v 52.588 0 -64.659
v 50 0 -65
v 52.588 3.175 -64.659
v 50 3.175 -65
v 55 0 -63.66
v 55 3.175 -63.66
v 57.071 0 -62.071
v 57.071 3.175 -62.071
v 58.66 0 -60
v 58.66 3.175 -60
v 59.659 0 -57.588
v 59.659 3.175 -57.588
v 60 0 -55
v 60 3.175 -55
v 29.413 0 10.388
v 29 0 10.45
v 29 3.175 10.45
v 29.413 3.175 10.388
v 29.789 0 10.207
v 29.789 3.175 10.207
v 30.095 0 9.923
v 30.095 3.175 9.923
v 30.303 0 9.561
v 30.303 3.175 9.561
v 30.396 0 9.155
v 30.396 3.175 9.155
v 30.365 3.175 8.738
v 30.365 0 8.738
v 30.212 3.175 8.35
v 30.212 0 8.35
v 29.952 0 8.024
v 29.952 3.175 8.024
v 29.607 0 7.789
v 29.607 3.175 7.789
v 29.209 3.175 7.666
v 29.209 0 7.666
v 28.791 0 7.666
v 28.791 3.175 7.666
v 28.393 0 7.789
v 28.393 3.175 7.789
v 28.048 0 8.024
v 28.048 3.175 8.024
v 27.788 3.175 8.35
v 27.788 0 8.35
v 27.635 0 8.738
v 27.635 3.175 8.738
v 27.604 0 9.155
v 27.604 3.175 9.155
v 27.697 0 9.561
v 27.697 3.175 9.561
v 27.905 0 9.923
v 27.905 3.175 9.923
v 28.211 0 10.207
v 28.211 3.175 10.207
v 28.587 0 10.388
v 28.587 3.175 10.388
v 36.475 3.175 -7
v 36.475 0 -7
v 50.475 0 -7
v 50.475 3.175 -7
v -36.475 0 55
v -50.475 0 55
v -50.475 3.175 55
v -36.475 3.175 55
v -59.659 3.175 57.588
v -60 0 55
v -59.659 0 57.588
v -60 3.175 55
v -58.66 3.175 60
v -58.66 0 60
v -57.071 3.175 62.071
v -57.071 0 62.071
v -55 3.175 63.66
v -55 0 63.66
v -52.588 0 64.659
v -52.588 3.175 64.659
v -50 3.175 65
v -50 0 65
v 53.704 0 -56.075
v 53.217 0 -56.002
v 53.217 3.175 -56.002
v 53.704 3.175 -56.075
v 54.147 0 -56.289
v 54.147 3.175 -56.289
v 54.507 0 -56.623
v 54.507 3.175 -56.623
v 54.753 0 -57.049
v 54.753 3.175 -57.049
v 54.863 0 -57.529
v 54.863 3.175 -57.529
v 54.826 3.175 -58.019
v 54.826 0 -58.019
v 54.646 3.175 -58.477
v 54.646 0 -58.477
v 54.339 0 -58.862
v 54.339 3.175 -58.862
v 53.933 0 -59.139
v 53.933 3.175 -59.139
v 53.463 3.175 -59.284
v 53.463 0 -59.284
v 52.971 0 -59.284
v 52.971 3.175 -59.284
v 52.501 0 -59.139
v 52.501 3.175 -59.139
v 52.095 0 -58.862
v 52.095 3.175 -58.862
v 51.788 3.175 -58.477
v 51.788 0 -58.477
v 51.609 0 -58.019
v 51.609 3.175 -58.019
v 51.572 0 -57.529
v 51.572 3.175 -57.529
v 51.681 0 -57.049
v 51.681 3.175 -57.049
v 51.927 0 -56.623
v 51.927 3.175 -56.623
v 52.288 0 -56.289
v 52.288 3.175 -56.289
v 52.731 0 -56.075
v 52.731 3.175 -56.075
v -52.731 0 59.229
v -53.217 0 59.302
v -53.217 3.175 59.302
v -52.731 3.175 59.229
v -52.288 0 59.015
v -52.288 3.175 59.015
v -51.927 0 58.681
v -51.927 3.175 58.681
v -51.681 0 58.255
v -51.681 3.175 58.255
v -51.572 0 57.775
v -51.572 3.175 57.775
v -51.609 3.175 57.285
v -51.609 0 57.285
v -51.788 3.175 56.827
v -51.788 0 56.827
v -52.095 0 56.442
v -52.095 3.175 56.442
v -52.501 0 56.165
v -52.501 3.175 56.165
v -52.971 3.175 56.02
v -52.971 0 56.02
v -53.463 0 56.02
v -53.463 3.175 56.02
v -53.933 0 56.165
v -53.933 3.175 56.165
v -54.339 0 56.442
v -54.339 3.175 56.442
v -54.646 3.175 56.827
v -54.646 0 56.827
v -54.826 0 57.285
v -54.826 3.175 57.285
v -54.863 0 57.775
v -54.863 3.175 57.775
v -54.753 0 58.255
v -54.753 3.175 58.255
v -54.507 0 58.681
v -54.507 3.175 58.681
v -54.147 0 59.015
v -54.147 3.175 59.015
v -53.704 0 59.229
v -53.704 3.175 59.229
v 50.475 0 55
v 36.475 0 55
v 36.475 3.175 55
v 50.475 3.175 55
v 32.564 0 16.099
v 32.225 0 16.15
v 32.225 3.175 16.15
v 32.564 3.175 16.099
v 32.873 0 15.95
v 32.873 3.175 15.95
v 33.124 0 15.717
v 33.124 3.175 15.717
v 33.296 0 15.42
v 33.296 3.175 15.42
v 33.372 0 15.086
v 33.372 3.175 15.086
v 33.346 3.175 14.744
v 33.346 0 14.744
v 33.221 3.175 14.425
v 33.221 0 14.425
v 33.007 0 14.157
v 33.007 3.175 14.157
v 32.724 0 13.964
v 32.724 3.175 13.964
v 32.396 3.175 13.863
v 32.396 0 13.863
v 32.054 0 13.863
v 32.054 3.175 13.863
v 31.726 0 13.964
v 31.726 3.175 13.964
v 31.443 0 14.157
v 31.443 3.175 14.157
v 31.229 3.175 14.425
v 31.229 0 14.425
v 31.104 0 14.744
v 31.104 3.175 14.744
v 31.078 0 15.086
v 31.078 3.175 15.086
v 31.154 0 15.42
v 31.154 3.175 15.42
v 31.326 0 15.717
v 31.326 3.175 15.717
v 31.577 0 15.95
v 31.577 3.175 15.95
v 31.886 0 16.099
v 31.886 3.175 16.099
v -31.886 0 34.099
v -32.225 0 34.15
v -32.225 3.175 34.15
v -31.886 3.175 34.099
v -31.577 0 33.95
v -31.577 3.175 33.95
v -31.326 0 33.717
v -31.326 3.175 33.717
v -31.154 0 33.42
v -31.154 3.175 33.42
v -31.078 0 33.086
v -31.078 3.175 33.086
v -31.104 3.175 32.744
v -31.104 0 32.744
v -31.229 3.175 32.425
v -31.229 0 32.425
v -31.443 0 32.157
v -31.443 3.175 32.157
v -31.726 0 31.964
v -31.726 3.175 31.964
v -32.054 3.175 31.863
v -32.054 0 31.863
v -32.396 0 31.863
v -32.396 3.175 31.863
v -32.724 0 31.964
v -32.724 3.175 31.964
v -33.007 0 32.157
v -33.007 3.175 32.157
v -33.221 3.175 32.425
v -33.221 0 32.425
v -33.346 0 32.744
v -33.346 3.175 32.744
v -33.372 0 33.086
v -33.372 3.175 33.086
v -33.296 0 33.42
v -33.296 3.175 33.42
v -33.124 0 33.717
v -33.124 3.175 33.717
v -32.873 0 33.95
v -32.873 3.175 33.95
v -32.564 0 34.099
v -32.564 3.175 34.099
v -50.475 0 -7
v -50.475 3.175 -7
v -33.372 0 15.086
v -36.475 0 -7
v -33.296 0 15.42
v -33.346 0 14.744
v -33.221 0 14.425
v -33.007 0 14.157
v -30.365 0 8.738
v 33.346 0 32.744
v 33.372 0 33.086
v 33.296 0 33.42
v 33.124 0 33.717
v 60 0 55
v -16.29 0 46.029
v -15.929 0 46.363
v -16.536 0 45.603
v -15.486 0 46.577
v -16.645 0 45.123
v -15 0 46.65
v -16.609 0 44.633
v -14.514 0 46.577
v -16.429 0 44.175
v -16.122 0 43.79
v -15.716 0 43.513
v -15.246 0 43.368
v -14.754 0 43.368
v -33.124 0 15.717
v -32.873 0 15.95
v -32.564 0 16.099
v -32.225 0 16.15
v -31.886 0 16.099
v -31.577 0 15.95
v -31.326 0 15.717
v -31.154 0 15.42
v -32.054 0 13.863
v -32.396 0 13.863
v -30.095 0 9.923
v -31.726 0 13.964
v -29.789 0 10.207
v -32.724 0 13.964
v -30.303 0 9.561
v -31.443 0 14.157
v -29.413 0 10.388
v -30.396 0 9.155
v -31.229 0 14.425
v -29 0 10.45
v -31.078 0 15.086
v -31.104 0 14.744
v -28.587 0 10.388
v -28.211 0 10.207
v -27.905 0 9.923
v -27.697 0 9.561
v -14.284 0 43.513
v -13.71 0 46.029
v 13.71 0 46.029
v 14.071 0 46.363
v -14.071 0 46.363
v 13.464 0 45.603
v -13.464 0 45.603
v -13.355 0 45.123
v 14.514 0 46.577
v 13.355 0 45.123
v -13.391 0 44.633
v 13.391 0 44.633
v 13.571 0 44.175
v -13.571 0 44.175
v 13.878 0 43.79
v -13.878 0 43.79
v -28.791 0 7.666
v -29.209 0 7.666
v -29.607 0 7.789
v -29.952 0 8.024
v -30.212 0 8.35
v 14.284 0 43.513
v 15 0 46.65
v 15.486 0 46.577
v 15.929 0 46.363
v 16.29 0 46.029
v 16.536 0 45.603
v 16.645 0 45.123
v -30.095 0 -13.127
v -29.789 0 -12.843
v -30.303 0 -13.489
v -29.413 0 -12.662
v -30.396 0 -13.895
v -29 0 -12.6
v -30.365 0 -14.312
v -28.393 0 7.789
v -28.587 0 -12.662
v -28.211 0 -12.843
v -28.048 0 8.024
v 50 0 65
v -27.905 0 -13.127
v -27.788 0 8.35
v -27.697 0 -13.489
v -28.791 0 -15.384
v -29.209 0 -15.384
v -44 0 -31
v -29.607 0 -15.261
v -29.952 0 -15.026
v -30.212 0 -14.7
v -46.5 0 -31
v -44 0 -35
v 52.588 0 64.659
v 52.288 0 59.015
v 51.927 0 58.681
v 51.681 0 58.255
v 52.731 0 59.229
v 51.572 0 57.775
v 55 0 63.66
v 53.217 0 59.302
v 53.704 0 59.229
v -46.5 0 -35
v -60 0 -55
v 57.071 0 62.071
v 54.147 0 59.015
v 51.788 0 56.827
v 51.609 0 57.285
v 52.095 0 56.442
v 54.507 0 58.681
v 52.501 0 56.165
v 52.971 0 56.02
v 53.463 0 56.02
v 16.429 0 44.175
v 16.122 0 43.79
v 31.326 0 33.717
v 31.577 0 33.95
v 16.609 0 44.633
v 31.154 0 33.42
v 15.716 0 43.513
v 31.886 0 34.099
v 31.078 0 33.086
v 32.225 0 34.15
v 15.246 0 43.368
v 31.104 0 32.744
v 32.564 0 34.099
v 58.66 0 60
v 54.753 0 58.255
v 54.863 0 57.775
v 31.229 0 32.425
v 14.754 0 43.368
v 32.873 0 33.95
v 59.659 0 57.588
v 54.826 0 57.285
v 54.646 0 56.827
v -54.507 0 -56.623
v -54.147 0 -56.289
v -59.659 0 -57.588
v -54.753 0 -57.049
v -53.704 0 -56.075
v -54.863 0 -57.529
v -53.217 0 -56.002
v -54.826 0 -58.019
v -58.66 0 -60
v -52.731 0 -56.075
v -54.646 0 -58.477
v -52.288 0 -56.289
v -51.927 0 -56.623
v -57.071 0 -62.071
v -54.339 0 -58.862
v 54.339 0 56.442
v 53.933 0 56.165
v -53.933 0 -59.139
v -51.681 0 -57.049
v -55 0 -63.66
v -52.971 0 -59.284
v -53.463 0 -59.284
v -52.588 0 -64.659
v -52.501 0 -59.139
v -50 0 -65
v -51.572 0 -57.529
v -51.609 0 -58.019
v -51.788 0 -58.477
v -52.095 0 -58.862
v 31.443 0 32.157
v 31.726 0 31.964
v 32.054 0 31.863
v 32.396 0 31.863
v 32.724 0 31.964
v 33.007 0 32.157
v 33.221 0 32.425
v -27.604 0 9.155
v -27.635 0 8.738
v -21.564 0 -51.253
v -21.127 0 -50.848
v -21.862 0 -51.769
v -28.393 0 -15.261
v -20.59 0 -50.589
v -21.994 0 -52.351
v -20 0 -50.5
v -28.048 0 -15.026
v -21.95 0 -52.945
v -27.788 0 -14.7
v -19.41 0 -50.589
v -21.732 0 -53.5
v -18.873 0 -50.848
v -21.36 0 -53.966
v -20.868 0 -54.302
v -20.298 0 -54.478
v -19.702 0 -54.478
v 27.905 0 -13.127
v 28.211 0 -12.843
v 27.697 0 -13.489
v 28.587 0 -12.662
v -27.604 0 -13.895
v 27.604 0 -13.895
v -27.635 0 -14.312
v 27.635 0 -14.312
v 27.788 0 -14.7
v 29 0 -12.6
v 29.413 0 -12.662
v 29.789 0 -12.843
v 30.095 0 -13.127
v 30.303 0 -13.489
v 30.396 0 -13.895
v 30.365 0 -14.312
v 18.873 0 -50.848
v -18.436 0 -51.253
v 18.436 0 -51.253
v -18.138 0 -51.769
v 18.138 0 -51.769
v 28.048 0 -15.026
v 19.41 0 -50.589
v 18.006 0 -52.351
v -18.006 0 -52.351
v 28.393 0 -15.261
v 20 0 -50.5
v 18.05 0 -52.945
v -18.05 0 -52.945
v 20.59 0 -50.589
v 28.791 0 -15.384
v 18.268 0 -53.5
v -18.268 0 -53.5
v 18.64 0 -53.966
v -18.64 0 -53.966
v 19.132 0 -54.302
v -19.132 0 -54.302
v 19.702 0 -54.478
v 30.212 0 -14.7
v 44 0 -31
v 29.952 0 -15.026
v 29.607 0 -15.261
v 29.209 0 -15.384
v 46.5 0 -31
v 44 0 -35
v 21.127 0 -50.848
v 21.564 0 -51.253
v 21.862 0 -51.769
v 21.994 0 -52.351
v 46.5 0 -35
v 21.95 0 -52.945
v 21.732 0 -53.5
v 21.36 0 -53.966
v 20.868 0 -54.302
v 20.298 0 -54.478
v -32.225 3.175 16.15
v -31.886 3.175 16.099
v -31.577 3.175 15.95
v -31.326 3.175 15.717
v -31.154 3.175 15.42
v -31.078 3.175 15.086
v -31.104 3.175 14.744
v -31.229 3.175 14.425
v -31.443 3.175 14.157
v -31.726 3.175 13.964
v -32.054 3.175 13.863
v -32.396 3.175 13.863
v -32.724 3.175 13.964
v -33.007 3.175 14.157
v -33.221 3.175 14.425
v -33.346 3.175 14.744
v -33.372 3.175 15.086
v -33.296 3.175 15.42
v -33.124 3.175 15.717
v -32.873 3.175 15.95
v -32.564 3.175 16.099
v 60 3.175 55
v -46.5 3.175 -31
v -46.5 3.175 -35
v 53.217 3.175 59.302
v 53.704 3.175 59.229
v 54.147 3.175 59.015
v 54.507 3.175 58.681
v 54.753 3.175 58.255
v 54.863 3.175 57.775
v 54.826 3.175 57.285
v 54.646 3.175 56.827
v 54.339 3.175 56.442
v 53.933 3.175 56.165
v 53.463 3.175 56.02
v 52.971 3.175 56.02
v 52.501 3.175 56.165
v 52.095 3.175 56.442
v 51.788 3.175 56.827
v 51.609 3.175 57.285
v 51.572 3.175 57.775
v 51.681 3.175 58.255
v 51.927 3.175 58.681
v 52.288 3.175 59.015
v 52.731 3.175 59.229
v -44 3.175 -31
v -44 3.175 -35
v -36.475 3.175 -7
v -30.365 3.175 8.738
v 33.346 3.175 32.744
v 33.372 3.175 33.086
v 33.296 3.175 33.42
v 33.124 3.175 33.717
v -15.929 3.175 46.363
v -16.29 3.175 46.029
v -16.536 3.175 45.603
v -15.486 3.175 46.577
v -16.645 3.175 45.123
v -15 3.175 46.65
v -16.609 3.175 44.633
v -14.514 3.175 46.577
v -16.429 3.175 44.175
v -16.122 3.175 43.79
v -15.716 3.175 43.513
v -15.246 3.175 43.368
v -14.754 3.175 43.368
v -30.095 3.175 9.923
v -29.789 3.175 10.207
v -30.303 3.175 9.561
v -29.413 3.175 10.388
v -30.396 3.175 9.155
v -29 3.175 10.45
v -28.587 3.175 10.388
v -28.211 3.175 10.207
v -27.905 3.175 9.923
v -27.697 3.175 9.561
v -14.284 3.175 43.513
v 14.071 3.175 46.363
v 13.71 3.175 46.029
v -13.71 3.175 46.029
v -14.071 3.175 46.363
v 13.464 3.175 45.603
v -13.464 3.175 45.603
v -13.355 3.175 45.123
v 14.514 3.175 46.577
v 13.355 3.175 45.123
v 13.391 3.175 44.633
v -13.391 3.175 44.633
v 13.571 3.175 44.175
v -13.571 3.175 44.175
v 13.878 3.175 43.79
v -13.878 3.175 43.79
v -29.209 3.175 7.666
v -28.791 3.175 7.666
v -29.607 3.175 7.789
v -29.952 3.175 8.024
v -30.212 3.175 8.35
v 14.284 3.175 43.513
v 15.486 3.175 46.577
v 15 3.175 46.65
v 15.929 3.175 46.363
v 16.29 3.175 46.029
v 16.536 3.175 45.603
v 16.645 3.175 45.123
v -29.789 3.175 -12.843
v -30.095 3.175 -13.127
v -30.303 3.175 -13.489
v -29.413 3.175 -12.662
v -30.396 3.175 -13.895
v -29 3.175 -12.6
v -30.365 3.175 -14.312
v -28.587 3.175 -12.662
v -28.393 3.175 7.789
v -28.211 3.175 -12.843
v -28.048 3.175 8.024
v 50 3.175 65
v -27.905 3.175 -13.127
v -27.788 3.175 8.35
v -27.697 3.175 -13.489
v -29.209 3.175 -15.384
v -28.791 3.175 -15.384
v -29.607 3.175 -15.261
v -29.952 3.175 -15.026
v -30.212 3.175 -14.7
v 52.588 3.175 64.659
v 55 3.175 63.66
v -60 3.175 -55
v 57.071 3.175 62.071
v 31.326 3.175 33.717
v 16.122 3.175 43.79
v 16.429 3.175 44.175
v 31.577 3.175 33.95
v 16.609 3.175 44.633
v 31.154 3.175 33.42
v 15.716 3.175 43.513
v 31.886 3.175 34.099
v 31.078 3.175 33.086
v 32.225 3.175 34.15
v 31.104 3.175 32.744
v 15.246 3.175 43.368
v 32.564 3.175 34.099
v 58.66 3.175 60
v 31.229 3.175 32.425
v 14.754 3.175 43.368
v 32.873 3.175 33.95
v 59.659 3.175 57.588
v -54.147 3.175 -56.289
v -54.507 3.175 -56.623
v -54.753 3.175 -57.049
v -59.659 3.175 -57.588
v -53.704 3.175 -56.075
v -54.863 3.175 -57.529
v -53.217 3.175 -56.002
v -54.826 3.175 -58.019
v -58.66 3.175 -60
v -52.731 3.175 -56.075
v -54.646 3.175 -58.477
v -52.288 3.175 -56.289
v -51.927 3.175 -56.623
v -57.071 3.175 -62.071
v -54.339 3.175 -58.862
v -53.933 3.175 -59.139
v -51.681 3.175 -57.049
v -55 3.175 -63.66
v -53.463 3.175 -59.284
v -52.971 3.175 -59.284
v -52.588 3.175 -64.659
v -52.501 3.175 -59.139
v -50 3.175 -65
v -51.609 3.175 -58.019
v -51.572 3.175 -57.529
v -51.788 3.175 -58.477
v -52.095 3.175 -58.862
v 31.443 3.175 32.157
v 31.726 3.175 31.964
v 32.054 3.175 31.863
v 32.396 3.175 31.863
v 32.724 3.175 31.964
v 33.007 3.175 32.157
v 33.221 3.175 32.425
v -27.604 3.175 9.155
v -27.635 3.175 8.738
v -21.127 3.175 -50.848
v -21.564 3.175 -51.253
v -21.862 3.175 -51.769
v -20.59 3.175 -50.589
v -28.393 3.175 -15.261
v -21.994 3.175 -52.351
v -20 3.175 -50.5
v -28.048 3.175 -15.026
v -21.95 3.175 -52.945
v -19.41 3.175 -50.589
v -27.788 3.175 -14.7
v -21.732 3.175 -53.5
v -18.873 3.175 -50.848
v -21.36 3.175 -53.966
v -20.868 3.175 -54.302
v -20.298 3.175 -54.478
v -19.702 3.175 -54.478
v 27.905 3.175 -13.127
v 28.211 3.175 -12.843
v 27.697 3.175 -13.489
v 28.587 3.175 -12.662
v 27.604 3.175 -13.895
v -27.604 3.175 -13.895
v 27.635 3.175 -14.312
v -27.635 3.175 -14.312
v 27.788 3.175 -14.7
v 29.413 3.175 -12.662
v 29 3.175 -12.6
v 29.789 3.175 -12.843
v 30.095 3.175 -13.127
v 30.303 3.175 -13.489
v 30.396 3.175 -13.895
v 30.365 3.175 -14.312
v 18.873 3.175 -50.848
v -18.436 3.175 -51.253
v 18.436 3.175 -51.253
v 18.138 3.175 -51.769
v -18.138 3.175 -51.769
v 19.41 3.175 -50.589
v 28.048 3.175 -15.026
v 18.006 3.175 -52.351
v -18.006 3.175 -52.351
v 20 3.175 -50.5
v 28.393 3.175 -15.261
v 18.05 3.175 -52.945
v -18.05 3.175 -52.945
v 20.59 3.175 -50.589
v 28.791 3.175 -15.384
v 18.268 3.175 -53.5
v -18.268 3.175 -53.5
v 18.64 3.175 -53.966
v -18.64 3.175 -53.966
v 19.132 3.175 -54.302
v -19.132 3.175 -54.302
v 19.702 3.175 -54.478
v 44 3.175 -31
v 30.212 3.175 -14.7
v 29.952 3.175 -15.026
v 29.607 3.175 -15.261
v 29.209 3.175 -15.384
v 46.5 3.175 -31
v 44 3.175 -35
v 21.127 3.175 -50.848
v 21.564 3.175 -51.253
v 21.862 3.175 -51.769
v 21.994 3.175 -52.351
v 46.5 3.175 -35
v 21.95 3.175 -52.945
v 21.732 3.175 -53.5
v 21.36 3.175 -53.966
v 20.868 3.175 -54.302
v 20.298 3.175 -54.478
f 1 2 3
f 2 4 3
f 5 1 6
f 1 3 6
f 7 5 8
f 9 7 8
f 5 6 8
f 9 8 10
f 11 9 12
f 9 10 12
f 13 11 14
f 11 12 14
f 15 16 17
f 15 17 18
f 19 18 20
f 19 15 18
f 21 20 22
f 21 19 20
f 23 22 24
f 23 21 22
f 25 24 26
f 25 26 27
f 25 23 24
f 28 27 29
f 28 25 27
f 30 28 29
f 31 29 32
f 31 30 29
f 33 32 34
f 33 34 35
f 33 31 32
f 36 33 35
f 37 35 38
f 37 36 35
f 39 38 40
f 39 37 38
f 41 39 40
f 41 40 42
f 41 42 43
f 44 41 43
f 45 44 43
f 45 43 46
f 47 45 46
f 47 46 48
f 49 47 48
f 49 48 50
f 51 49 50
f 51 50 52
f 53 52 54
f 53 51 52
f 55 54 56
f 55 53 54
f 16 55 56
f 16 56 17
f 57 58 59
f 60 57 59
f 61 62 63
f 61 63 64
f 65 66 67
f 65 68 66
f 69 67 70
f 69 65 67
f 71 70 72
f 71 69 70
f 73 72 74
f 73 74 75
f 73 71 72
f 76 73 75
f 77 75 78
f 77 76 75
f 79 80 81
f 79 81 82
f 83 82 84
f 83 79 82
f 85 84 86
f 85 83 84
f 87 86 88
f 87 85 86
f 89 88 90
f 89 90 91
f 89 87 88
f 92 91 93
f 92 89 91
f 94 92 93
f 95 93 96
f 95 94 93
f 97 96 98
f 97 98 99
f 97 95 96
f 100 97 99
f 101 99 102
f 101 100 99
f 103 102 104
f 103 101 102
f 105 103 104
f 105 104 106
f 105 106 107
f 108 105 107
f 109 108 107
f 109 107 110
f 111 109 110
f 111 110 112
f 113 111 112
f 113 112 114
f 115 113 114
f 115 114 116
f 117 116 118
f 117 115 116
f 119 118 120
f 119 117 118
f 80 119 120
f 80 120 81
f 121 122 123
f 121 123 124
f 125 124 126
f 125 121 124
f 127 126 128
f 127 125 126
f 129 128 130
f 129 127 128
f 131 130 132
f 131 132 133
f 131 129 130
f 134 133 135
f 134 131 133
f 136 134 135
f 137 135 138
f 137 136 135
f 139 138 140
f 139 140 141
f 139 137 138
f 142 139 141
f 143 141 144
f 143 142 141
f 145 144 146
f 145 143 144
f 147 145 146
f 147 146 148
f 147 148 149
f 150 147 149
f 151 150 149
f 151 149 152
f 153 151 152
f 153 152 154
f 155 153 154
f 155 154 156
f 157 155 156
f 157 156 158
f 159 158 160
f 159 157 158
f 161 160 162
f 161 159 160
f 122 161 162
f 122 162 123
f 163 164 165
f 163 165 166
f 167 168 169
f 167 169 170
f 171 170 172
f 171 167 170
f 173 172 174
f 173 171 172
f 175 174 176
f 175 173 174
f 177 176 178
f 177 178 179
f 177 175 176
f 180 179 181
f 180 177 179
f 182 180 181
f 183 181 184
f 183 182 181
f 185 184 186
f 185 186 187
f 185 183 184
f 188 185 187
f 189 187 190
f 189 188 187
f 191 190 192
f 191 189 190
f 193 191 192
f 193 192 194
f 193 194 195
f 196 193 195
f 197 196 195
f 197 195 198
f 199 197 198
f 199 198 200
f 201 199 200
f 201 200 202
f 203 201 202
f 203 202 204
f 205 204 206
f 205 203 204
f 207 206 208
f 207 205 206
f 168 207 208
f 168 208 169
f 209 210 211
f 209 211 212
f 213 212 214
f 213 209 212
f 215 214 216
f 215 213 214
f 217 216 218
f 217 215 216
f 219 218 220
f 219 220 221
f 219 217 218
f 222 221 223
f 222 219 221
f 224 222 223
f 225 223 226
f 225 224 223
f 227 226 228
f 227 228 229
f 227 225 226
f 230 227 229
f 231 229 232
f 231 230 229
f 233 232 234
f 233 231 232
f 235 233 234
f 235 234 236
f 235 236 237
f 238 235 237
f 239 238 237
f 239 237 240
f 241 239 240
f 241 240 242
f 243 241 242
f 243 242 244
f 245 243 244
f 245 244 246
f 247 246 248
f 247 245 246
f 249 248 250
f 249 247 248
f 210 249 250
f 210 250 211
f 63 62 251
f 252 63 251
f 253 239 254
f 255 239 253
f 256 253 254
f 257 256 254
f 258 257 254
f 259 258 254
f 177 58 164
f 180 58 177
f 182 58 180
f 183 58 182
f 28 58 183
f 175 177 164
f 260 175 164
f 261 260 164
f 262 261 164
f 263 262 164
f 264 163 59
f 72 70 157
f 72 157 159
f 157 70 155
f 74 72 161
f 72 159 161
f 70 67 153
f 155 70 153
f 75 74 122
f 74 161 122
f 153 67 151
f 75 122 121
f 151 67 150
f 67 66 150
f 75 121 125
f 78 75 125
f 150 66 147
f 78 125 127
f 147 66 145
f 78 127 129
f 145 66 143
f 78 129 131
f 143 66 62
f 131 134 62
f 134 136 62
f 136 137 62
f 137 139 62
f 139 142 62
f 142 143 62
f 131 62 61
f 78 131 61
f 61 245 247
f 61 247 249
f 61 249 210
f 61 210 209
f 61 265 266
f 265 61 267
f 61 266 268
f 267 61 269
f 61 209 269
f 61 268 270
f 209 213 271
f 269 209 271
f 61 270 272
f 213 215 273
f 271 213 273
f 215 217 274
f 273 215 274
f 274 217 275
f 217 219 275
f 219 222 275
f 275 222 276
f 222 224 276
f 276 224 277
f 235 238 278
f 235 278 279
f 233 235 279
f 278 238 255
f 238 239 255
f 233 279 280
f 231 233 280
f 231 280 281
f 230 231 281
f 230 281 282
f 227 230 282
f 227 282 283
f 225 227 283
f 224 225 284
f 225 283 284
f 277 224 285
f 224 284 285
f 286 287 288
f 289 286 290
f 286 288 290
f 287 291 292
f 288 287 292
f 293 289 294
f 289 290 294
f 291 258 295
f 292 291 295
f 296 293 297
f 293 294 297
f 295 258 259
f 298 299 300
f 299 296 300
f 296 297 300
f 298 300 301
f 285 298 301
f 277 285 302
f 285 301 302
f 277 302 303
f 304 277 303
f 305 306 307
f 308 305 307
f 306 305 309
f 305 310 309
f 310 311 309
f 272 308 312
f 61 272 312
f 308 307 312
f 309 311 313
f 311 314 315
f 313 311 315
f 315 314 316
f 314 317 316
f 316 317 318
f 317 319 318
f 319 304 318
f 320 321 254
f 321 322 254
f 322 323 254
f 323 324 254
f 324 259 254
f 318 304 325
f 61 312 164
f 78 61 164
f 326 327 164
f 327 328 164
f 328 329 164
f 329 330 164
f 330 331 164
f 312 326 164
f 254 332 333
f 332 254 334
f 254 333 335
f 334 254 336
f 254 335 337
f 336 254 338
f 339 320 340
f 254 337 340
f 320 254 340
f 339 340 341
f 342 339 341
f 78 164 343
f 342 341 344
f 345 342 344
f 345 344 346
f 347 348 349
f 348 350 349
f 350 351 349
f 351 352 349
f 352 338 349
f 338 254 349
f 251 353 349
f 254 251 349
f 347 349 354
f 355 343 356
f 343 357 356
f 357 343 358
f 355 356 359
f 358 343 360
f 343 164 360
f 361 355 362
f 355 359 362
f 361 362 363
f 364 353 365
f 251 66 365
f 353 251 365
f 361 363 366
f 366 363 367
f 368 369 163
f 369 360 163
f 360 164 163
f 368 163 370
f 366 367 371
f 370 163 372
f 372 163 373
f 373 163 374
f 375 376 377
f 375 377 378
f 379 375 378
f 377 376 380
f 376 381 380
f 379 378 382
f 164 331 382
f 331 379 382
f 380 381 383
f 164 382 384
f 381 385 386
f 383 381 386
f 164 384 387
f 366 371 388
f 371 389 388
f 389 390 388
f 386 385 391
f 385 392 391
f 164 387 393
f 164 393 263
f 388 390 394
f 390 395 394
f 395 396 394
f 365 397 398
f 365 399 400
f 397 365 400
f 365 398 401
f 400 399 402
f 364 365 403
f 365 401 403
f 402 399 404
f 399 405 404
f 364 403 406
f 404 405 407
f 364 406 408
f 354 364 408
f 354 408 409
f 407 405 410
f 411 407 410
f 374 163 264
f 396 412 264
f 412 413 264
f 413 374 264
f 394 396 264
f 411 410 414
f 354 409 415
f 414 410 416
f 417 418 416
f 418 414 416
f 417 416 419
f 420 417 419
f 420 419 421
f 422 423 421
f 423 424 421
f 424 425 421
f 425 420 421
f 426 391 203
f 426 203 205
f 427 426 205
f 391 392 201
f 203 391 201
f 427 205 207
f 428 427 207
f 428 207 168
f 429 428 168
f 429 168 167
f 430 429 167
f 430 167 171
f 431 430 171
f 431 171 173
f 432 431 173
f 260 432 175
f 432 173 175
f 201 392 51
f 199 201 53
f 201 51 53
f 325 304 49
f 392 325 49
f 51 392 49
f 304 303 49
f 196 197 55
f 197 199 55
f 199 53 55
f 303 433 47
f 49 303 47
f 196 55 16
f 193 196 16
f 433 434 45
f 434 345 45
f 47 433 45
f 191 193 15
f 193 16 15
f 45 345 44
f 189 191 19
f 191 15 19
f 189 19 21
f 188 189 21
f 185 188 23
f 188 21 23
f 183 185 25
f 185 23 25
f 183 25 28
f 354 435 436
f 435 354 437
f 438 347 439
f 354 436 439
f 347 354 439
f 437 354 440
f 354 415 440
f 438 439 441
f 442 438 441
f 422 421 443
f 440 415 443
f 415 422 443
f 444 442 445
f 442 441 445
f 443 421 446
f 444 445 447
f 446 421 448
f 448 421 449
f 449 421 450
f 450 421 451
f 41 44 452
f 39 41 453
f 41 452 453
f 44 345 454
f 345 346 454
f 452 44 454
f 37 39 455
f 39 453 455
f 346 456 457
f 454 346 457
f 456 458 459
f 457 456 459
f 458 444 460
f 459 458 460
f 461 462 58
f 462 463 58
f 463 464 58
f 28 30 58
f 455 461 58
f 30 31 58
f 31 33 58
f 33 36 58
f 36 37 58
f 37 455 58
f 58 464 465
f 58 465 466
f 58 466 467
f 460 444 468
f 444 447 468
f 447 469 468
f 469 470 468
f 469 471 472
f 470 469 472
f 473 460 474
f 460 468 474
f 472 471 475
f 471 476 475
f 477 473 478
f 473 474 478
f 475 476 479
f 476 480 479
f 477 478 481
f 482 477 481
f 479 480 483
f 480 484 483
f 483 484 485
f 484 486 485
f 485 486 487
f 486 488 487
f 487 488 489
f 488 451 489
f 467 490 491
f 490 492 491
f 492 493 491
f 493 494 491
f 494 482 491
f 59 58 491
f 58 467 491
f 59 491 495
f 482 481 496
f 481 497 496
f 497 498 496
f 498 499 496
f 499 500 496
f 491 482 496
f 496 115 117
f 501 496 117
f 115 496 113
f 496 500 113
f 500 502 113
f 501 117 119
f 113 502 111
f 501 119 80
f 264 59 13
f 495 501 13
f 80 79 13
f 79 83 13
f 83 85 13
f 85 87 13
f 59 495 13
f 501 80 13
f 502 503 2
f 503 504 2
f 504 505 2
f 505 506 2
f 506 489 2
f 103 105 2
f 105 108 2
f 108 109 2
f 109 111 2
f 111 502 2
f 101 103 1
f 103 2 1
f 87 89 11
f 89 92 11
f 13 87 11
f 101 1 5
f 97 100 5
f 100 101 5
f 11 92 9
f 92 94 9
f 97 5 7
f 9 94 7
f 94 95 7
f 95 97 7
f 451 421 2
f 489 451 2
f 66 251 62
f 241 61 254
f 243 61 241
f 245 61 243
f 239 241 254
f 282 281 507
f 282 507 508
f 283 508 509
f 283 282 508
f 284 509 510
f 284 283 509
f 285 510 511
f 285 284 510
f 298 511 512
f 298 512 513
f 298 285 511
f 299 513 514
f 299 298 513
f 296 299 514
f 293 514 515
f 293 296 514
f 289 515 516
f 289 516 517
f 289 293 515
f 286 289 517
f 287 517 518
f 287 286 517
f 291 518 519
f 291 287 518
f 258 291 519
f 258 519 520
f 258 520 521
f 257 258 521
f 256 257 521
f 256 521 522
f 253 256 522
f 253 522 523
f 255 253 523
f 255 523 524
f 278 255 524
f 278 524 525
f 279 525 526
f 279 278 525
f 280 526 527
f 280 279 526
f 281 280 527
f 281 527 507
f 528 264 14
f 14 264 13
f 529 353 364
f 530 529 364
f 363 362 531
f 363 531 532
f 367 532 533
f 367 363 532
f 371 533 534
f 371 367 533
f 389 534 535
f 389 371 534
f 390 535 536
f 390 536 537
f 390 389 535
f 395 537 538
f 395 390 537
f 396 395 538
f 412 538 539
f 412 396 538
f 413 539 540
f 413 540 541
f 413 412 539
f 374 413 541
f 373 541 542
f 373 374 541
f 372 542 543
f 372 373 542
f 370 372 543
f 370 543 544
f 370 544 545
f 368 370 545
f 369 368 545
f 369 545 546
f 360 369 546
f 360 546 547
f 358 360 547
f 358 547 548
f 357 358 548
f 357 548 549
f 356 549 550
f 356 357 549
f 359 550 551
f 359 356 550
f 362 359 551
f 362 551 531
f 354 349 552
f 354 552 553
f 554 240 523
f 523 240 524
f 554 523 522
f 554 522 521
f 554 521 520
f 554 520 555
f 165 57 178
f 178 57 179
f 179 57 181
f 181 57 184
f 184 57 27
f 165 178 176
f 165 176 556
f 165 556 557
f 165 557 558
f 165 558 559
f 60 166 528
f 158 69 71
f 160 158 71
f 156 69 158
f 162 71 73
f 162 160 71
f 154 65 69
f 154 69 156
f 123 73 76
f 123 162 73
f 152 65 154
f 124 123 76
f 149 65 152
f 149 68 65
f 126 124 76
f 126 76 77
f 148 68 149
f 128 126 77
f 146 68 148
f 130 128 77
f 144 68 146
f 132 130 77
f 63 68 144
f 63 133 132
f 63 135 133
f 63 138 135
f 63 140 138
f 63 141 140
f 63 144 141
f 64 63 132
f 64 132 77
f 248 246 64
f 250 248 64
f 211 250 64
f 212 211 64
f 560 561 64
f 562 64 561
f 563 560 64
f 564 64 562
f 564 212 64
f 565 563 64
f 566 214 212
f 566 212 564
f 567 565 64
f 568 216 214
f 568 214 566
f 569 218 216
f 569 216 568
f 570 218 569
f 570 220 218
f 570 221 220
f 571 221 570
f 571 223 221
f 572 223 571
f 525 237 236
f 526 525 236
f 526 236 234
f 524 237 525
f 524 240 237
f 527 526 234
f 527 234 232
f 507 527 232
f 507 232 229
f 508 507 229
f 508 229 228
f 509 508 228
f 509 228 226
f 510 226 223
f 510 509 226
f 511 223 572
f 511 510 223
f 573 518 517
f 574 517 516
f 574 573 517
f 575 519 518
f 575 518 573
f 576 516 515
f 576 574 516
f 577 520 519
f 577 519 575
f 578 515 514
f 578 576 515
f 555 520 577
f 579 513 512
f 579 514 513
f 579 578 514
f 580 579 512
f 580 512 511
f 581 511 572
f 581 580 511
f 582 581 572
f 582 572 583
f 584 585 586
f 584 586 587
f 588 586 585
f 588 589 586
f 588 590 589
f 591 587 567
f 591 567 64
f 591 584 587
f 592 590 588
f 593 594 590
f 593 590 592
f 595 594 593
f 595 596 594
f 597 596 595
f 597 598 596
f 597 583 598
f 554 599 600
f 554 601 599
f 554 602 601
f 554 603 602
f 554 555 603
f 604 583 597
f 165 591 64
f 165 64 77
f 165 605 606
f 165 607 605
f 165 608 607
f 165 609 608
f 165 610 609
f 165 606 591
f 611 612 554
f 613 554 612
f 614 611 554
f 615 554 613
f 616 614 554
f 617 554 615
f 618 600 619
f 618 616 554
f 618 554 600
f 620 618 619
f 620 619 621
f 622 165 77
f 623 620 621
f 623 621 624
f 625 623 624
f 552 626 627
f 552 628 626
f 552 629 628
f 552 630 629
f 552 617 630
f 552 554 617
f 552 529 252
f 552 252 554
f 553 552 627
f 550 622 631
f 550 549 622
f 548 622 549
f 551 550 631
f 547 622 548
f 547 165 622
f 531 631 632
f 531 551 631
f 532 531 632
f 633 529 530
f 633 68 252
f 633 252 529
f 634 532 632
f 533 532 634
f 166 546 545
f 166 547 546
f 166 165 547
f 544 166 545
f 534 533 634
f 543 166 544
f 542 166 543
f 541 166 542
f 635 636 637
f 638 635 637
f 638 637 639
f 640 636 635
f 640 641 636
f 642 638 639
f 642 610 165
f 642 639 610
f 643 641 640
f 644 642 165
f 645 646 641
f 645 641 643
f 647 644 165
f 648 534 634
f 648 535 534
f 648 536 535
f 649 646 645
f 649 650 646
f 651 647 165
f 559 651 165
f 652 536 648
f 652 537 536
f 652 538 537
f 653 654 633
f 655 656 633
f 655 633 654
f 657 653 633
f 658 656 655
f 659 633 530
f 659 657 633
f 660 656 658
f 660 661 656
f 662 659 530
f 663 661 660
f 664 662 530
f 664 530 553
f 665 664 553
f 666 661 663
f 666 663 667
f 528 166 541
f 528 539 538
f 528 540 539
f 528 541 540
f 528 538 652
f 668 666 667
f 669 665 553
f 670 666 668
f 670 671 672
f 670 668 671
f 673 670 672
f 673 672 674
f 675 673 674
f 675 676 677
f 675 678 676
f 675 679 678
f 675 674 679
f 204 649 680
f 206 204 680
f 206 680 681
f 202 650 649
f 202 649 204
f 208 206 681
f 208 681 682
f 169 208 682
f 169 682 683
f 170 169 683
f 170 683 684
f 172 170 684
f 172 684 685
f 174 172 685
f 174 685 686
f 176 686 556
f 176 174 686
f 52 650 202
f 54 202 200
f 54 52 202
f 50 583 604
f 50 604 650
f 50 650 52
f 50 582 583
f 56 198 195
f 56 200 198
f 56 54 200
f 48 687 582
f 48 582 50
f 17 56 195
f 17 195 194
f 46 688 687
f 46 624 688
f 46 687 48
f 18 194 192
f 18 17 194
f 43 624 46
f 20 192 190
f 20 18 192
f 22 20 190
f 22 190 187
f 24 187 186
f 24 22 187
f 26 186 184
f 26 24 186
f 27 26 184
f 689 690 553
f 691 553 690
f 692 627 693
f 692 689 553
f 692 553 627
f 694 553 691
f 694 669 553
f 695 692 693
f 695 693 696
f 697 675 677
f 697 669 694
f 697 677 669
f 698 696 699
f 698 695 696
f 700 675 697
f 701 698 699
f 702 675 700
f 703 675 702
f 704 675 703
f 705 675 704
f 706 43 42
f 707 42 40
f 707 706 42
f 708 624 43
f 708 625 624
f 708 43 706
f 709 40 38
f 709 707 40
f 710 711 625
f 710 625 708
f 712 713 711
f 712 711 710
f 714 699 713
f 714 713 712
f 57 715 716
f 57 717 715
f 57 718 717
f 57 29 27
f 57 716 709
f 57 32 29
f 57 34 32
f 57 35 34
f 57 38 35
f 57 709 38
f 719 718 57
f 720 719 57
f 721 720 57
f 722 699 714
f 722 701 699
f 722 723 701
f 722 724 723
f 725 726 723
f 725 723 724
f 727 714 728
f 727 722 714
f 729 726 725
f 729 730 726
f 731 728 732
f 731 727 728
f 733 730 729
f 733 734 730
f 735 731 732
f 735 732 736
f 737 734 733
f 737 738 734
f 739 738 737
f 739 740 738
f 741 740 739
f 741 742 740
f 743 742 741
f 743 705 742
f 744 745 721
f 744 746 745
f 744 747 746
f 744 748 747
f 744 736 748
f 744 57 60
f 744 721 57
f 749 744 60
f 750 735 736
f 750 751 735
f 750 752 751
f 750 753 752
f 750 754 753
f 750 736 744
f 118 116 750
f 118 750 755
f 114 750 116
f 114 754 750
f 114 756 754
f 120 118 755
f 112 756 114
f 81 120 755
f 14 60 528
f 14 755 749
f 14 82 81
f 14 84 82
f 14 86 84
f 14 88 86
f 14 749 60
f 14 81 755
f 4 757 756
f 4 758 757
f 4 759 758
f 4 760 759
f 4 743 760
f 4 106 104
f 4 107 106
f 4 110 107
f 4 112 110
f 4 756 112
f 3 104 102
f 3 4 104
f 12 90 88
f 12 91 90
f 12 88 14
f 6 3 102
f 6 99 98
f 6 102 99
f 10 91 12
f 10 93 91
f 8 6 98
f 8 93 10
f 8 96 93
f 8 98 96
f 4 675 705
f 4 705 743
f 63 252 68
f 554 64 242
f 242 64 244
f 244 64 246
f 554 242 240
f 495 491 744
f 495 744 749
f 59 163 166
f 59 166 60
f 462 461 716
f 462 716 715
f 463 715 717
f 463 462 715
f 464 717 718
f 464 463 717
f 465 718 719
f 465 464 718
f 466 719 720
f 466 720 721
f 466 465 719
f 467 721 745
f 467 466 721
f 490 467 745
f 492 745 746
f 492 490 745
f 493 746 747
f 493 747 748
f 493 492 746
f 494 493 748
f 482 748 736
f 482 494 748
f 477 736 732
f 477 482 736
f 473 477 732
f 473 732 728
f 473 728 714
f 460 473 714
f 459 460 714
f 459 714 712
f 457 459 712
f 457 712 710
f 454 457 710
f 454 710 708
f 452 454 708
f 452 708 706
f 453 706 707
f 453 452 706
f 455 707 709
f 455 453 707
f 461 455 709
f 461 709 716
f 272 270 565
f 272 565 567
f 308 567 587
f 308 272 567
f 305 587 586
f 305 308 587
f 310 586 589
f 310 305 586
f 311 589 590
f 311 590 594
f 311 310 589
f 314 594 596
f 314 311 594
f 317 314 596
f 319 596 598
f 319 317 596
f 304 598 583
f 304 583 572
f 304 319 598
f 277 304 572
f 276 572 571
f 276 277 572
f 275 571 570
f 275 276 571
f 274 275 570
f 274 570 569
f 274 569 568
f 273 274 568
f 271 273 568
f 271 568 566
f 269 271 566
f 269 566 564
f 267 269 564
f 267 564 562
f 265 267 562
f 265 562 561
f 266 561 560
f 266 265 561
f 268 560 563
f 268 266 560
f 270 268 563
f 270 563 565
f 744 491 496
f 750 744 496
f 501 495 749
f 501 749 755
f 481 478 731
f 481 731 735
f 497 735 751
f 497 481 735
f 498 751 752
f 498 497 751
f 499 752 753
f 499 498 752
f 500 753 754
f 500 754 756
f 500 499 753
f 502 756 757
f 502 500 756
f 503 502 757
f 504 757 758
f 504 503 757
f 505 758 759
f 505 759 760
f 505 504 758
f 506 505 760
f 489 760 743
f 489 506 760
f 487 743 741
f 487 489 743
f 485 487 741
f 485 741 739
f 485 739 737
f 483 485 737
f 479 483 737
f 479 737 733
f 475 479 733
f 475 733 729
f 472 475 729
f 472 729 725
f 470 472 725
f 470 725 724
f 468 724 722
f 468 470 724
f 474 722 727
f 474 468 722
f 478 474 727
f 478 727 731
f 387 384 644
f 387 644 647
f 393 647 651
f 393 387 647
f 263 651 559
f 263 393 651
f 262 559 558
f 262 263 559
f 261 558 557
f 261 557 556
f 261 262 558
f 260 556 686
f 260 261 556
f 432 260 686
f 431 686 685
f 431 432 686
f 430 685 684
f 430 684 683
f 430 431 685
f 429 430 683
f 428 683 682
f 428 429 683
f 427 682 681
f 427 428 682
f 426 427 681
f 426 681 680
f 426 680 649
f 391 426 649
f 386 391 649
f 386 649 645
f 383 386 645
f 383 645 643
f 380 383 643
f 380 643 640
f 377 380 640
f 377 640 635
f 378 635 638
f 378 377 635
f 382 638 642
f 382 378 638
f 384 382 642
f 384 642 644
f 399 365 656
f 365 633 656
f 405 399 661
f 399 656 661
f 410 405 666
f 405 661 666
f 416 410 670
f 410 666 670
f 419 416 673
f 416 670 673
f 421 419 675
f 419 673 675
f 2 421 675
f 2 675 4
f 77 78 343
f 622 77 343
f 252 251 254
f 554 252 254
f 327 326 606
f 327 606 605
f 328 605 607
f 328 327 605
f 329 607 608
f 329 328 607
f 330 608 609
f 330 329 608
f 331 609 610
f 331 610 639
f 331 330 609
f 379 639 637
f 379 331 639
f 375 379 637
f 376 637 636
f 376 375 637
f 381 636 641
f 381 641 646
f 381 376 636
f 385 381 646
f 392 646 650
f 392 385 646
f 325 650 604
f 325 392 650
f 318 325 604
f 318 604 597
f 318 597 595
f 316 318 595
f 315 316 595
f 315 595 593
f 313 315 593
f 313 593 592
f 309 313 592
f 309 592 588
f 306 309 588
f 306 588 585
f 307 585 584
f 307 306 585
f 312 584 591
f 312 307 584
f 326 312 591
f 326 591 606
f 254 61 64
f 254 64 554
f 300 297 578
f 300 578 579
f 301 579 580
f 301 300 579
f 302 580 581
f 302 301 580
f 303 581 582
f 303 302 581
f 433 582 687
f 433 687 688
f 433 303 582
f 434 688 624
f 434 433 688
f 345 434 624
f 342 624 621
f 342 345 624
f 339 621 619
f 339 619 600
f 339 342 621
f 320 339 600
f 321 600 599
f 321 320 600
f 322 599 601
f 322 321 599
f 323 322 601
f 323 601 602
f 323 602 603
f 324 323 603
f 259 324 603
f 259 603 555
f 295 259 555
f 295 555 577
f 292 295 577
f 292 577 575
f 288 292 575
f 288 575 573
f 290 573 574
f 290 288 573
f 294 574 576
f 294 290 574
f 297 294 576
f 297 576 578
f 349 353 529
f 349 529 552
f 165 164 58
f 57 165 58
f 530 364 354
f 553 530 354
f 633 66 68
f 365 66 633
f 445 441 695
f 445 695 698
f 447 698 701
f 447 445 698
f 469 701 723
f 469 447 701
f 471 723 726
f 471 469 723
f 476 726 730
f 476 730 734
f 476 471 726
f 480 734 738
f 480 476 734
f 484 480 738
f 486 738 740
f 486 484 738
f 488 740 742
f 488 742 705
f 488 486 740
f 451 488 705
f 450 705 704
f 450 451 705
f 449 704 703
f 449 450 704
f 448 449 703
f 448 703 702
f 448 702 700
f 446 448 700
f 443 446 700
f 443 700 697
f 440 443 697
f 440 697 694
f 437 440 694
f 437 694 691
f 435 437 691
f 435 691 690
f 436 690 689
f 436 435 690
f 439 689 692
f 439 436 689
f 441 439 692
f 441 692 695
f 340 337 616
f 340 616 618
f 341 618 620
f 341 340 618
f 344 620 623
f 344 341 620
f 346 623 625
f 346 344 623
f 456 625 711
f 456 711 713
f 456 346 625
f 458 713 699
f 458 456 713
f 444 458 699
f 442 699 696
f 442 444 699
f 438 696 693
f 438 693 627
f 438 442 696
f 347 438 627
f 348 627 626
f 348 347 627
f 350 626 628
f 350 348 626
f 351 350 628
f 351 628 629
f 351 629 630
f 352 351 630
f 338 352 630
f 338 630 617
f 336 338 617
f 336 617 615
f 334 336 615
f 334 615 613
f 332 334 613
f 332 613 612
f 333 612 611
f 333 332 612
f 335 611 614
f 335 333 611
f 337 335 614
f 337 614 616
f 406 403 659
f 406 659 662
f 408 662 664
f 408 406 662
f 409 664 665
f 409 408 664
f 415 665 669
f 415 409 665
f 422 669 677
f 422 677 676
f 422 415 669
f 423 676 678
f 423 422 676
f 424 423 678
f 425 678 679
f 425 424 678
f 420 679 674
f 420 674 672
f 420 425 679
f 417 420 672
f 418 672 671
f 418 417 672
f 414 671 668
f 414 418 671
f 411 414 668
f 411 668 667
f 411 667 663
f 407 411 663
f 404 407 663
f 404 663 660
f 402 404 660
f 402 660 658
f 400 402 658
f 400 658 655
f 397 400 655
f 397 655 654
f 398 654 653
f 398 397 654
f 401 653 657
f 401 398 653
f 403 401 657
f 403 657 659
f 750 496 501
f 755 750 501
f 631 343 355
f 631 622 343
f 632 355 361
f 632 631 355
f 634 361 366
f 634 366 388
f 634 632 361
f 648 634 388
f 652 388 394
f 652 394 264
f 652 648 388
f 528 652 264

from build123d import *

# Parameters (mm, degrees)
SKETCH1_W           = 120
SKETCH1_H           = 130
SKETCH1_R           = 1.4
SKETCH1_R_2         = 1.15
SKETCH1_R_3         = 2
SKETCH1_R_4         = 1.65
SKETCH1_W_2         = 14
SKETCH1_H_2         = 62
SKETCH1_W_3         = 2.5
SKETCH1_H_3         = 4
BOSS_EXTRUDE1_DEPTH = 3.175
FILLET1_R           = 10


with BuildPart() as part:
    # Sketch1 → Boss-Extrude1 (new body)
    with BuildSketch(Plane(origin=(0, 0, 0), x_dir=(1, 0, 0), z_dir=(0, 1, 0))):
        Rectangle(SKETCH1_W, SKETCH1_H)
        with Locations(Location((29, 14, 0), (0, 0, 270))):
            Circle(SKETCH1_R, mode=Mode.SUBTRACT)
        with Locations(Location((29, -9.05, 0), (0, 0, 270))):
            Circle(SKETCH1_R, mode=Mode.SUBTRACT)
        with Locations(Location((-29, -9.05, 0), (0, 0, 270))):
            Circle(SKETCH1_R, mode=Mode.SUBTRACT)
        with Locations(Location((-29, 14, 0), (0, 0, 270))):
            Circle(SKETCH1_R, mode=Mode.SUBTRACT)
        with Locations(Location((32.225, -15, 0), (0, 0, 270))):
            Circle(SKETCH1_R_2, mode=Mode.SUBTRACT)
        with Locations(Location((32.225, -33, 0), (0, 0, 270))):
            Circle(SKETCH1_R_2, mode=Mode.SUBTRACT)
        with Locations(Location((-32.225, -33, 0), (0, 0, 270))):
            Circle(SKETCH1_R_2, mode=Mode.SUBTRACT)
        with Locations(Location((-32.225, -15, 0), (0, 0, 270))):
            Circle(SKETCH1_R_2, mode=Mode.SUBTRACT)
        with Locations(Location((20, 52.5, 0), (0, 0, 270))):
            Circle(SKETCH1_R_3, mode=Mode.SUBTRACT)
        with Locations(Location((-20, 52.5, 0), (0, 0, 270))):
            Circle(SKETCH1_R_3, mode=Mode.SUBTRACT)
        with Locations(Location((53.217198973, -57.651965554, 0), (0, 0, 270))):
            Circle(SKETCH1_R_4, mode=Mode.SUBTRACT)
        with Locations(Location((53.217198973, 57.651965554, 0), (0, 0, 270))):
            Circle(SKETCH1_R_4, mode=Mode.SUBTRACT)
        with Locations(Location((-53.217198973, -57.651965554, 0), (0, 0, 270))):
            Circle(SKETCH1_R_4, mode=Mode.SUBTRACT)
        with Locations(Location((-53.217198973, 57.651965554, 0), (0, 0, 270))):
            Circle(SKETCH1_R_4, mode=Mode.SUBTRACT)
        with Locations(Location((-15, -45, 0), (0, 0, 270))):
            Circle(SKETCH1_R_4, mode=Mode.SUBTRACT)
        with Locations(Location((15, -45, 0), (0, 0, 270))):
            Circle(SKETCH1_R_4, mode=Mode.SUBTRACT)
        with Locations((-43.475, -24)):
            Rectangle(SKETCH1_W_2, SKETCH1_H_2, mode=Mode.SUBTRACT)
        with Locations((43.475, -24)):
            Rectangle(SKETCH1_W_2, SKETCH1_H_2, mode=Mode.SUBTRACT)
        with Locations((45.25, 33)):
            Rectangle(SKETCH1_W_3, SKETCH1_H_3, mode=Mode.SUBTRACT)
        with Locations((-45.25, 33)):
            Rectangle(SKETCH1_W_3, SKETCH1_H_3, mode=Mode.SUBTRACT)
    extrude(amount=BOSS_EXTRUDE1_DEPTH)

    # Fillet1
    fillet1_edges = [part.edges().sort_by_distance(p)[0] for p in [
        (60, 1.5875, 65),
        (-60, 1.5875, 65),
        (-60, 1.5875, -65),
        (60, 1.5875, -65),
    ]]
    fillet(fillet1_edges, radius=FILLET1_R)


solid = part.part
